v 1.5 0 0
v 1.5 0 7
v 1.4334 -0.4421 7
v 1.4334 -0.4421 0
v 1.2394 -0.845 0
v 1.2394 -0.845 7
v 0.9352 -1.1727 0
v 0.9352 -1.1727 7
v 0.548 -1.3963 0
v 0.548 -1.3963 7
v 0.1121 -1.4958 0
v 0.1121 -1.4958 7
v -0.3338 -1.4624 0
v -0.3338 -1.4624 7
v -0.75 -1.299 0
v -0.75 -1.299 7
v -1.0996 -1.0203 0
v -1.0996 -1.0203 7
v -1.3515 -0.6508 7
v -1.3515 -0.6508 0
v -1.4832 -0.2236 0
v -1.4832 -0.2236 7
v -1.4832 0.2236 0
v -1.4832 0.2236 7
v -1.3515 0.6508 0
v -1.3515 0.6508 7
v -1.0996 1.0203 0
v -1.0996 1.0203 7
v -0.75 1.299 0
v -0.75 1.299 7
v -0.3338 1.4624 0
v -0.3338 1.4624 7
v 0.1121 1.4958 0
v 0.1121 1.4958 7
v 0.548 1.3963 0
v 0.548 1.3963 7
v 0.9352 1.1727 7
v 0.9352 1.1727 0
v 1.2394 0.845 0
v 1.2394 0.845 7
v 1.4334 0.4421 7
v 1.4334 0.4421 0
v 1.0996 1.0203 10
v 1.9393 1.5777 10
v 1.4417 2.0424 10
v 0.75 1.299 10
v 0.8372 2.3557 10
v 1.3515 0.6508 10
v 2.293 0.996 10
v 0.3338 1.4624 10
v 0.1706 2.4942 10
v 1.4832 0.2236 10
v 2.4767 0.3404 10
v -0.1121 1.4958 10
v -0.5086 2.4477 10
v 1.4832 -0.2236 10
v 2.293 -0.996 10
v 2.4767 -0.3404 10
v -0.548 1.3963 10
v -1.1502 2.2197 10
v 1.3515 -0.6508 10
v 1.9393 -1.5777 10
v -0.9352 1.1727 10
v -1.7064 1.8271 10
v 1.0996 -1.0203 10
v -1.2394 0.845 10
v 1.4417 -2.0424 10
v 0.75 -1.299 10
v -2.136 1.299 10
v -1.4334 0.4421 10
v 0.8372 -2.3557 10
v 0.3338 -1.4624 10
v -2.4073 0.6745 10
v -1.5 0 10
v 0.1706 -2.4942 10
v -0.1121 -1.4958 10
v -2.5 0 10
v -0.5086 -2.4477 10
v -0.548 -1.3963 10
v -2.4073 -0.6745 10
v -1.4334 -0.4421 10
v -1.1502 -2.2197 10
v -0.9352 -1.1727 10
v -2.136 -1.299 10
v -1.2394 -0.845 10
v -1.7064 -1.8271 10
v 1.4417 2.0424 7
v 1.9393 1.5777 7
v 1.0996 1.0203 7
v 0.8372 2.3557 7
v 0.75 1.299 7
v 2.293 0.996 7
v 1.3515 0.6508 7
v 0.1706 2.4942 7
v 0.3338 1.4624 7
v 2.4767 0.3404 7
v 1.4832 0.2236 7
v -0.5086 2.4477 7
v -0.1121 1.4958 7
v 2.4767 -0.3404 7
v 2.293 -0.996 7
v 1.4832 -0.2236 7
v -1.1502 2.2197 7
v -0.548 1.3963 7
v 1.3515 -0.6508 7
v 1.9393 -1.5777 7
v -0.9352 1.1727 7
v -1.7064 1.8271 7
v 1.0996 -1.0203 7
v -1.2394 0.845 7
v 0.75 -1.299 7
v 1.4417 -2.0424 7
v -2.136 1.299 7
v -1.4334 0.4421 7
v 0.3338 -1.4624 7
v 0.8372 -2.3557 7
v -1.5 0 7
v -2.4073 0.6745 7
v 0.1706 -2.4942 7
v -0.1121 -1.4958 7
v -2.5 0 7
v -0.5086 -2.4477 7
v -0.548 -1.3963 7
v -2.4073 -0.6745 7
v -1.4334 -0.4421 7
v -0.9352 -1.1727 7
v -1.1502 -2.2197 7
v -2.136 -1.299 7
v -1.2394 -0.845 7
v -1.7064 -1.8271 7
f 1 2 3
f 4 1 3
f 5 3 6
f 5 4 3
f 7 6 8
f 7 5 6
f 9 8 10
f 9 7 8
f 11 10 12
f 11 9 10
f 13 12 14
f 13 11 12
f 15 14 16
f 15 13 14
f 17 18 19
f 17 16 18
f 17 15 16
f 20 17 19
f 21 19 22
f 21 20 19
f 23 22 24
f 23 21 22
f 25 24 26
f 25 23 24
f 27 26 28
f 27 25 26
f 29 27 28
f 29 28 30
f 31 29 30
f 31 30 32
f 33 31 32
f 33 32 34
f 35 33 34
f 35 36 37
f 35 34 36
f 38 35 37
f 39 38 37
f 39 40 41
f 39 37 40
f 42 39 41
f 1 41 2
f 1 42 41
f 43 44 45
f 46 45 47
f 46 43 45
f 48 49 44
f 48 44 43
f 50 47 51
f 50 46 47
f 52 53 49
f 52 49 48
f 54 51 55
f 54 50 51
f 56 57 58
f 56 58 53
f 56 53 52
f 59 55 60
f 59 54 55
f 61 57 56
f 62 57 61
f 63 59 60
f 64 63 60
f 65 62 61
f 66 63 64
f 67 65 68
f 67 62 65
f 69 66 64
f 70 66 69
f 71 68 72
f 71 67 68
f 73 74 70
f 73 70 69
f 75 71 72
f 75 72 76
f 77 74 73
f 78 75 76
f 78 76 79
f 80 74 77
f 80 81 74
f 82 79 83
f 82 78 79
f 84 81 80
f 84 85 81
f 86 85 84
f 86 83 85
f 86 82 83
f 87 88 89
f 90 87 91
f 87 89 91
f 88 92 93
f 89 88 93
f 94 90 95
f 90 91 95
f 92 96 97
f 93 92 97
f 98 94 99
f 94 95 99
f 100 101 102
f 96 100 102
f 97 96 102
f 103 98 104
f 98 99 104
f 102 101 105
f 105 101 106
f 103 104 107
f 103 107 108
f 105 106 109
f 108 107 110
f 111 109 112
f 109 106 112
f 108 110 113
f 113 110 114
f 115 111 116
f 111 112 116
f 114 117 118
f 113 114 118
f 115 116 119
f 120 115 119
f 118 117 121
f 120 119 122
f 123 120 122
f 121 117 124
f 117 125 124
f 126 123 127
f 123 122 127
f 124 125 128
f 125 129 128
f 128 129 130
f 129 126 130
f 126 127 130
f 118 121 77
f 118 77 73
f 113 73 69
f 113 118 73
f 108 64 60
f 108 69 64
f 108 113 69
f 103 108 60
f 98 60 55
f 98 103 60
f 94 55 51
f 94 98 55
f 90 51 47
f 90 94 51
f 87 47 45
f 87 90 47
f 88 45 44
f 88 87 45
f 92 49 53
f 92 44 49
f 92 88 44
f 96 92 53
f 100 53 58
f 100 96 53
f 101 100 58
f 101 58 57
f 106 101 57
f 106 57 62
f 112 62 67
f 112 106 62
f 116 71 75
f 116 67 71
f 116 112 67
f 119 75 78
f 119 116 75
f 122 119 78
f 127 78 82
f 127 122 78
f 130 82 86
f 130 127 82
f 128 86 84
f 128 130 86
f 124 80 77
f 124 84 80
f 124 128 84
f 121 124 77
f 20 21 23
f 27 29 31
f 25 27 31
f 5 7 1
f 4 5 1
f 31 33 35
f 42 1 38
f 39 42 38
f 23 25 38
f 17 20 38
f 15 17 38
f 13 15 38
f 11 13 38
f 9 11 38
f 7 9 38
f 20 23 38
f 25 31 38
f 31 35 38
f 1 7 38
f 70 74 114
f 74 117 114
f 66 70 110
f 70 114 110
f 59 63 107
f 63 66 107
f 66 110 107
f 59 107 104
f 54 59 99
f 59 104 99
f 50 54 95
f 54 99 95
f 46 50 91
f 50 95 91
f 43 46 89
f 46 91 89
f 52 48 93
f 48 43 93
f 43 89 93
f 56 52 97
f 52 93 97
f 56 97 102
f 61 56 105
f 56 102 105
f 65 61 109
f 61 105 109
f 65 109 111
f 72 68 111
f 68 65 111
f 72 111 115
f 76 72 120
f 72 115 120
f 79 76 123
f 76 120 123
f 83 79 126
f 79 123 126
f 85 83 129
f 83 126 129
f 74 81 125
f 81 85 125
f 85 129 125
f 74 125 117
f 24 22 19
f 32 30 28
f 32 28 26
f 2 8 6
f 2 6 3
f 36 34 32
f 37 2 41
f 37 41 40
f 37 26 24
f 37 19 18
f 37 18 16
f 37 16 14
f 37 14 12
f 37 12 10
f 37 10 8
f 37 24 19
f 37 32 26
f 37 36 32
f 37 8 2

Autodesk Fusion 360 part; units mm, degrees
sketch "Boceto1" plane through (0, 0, 0) normal (0, 0, 1) x (1, 0, 0)
  circle A0 centre (0, 0) radius 1.5
  dimension "d1" = 3
extrude "Extruir1" add sketch "Boceto1" along normal blind 7 makes body 1
sketch "Boceto2" plane through (0, 0, 7) normal (0, 0, 1) x (-1, 0, 0)
  circle A0 centre (0, 0) radius 1.5
  circle A1 centre (0, 0) radius 2.5
  dimension "d4" = 5
extrude "Extruir2" add sketch "Boceto2" along normal blind 3 separate body makes body 2
